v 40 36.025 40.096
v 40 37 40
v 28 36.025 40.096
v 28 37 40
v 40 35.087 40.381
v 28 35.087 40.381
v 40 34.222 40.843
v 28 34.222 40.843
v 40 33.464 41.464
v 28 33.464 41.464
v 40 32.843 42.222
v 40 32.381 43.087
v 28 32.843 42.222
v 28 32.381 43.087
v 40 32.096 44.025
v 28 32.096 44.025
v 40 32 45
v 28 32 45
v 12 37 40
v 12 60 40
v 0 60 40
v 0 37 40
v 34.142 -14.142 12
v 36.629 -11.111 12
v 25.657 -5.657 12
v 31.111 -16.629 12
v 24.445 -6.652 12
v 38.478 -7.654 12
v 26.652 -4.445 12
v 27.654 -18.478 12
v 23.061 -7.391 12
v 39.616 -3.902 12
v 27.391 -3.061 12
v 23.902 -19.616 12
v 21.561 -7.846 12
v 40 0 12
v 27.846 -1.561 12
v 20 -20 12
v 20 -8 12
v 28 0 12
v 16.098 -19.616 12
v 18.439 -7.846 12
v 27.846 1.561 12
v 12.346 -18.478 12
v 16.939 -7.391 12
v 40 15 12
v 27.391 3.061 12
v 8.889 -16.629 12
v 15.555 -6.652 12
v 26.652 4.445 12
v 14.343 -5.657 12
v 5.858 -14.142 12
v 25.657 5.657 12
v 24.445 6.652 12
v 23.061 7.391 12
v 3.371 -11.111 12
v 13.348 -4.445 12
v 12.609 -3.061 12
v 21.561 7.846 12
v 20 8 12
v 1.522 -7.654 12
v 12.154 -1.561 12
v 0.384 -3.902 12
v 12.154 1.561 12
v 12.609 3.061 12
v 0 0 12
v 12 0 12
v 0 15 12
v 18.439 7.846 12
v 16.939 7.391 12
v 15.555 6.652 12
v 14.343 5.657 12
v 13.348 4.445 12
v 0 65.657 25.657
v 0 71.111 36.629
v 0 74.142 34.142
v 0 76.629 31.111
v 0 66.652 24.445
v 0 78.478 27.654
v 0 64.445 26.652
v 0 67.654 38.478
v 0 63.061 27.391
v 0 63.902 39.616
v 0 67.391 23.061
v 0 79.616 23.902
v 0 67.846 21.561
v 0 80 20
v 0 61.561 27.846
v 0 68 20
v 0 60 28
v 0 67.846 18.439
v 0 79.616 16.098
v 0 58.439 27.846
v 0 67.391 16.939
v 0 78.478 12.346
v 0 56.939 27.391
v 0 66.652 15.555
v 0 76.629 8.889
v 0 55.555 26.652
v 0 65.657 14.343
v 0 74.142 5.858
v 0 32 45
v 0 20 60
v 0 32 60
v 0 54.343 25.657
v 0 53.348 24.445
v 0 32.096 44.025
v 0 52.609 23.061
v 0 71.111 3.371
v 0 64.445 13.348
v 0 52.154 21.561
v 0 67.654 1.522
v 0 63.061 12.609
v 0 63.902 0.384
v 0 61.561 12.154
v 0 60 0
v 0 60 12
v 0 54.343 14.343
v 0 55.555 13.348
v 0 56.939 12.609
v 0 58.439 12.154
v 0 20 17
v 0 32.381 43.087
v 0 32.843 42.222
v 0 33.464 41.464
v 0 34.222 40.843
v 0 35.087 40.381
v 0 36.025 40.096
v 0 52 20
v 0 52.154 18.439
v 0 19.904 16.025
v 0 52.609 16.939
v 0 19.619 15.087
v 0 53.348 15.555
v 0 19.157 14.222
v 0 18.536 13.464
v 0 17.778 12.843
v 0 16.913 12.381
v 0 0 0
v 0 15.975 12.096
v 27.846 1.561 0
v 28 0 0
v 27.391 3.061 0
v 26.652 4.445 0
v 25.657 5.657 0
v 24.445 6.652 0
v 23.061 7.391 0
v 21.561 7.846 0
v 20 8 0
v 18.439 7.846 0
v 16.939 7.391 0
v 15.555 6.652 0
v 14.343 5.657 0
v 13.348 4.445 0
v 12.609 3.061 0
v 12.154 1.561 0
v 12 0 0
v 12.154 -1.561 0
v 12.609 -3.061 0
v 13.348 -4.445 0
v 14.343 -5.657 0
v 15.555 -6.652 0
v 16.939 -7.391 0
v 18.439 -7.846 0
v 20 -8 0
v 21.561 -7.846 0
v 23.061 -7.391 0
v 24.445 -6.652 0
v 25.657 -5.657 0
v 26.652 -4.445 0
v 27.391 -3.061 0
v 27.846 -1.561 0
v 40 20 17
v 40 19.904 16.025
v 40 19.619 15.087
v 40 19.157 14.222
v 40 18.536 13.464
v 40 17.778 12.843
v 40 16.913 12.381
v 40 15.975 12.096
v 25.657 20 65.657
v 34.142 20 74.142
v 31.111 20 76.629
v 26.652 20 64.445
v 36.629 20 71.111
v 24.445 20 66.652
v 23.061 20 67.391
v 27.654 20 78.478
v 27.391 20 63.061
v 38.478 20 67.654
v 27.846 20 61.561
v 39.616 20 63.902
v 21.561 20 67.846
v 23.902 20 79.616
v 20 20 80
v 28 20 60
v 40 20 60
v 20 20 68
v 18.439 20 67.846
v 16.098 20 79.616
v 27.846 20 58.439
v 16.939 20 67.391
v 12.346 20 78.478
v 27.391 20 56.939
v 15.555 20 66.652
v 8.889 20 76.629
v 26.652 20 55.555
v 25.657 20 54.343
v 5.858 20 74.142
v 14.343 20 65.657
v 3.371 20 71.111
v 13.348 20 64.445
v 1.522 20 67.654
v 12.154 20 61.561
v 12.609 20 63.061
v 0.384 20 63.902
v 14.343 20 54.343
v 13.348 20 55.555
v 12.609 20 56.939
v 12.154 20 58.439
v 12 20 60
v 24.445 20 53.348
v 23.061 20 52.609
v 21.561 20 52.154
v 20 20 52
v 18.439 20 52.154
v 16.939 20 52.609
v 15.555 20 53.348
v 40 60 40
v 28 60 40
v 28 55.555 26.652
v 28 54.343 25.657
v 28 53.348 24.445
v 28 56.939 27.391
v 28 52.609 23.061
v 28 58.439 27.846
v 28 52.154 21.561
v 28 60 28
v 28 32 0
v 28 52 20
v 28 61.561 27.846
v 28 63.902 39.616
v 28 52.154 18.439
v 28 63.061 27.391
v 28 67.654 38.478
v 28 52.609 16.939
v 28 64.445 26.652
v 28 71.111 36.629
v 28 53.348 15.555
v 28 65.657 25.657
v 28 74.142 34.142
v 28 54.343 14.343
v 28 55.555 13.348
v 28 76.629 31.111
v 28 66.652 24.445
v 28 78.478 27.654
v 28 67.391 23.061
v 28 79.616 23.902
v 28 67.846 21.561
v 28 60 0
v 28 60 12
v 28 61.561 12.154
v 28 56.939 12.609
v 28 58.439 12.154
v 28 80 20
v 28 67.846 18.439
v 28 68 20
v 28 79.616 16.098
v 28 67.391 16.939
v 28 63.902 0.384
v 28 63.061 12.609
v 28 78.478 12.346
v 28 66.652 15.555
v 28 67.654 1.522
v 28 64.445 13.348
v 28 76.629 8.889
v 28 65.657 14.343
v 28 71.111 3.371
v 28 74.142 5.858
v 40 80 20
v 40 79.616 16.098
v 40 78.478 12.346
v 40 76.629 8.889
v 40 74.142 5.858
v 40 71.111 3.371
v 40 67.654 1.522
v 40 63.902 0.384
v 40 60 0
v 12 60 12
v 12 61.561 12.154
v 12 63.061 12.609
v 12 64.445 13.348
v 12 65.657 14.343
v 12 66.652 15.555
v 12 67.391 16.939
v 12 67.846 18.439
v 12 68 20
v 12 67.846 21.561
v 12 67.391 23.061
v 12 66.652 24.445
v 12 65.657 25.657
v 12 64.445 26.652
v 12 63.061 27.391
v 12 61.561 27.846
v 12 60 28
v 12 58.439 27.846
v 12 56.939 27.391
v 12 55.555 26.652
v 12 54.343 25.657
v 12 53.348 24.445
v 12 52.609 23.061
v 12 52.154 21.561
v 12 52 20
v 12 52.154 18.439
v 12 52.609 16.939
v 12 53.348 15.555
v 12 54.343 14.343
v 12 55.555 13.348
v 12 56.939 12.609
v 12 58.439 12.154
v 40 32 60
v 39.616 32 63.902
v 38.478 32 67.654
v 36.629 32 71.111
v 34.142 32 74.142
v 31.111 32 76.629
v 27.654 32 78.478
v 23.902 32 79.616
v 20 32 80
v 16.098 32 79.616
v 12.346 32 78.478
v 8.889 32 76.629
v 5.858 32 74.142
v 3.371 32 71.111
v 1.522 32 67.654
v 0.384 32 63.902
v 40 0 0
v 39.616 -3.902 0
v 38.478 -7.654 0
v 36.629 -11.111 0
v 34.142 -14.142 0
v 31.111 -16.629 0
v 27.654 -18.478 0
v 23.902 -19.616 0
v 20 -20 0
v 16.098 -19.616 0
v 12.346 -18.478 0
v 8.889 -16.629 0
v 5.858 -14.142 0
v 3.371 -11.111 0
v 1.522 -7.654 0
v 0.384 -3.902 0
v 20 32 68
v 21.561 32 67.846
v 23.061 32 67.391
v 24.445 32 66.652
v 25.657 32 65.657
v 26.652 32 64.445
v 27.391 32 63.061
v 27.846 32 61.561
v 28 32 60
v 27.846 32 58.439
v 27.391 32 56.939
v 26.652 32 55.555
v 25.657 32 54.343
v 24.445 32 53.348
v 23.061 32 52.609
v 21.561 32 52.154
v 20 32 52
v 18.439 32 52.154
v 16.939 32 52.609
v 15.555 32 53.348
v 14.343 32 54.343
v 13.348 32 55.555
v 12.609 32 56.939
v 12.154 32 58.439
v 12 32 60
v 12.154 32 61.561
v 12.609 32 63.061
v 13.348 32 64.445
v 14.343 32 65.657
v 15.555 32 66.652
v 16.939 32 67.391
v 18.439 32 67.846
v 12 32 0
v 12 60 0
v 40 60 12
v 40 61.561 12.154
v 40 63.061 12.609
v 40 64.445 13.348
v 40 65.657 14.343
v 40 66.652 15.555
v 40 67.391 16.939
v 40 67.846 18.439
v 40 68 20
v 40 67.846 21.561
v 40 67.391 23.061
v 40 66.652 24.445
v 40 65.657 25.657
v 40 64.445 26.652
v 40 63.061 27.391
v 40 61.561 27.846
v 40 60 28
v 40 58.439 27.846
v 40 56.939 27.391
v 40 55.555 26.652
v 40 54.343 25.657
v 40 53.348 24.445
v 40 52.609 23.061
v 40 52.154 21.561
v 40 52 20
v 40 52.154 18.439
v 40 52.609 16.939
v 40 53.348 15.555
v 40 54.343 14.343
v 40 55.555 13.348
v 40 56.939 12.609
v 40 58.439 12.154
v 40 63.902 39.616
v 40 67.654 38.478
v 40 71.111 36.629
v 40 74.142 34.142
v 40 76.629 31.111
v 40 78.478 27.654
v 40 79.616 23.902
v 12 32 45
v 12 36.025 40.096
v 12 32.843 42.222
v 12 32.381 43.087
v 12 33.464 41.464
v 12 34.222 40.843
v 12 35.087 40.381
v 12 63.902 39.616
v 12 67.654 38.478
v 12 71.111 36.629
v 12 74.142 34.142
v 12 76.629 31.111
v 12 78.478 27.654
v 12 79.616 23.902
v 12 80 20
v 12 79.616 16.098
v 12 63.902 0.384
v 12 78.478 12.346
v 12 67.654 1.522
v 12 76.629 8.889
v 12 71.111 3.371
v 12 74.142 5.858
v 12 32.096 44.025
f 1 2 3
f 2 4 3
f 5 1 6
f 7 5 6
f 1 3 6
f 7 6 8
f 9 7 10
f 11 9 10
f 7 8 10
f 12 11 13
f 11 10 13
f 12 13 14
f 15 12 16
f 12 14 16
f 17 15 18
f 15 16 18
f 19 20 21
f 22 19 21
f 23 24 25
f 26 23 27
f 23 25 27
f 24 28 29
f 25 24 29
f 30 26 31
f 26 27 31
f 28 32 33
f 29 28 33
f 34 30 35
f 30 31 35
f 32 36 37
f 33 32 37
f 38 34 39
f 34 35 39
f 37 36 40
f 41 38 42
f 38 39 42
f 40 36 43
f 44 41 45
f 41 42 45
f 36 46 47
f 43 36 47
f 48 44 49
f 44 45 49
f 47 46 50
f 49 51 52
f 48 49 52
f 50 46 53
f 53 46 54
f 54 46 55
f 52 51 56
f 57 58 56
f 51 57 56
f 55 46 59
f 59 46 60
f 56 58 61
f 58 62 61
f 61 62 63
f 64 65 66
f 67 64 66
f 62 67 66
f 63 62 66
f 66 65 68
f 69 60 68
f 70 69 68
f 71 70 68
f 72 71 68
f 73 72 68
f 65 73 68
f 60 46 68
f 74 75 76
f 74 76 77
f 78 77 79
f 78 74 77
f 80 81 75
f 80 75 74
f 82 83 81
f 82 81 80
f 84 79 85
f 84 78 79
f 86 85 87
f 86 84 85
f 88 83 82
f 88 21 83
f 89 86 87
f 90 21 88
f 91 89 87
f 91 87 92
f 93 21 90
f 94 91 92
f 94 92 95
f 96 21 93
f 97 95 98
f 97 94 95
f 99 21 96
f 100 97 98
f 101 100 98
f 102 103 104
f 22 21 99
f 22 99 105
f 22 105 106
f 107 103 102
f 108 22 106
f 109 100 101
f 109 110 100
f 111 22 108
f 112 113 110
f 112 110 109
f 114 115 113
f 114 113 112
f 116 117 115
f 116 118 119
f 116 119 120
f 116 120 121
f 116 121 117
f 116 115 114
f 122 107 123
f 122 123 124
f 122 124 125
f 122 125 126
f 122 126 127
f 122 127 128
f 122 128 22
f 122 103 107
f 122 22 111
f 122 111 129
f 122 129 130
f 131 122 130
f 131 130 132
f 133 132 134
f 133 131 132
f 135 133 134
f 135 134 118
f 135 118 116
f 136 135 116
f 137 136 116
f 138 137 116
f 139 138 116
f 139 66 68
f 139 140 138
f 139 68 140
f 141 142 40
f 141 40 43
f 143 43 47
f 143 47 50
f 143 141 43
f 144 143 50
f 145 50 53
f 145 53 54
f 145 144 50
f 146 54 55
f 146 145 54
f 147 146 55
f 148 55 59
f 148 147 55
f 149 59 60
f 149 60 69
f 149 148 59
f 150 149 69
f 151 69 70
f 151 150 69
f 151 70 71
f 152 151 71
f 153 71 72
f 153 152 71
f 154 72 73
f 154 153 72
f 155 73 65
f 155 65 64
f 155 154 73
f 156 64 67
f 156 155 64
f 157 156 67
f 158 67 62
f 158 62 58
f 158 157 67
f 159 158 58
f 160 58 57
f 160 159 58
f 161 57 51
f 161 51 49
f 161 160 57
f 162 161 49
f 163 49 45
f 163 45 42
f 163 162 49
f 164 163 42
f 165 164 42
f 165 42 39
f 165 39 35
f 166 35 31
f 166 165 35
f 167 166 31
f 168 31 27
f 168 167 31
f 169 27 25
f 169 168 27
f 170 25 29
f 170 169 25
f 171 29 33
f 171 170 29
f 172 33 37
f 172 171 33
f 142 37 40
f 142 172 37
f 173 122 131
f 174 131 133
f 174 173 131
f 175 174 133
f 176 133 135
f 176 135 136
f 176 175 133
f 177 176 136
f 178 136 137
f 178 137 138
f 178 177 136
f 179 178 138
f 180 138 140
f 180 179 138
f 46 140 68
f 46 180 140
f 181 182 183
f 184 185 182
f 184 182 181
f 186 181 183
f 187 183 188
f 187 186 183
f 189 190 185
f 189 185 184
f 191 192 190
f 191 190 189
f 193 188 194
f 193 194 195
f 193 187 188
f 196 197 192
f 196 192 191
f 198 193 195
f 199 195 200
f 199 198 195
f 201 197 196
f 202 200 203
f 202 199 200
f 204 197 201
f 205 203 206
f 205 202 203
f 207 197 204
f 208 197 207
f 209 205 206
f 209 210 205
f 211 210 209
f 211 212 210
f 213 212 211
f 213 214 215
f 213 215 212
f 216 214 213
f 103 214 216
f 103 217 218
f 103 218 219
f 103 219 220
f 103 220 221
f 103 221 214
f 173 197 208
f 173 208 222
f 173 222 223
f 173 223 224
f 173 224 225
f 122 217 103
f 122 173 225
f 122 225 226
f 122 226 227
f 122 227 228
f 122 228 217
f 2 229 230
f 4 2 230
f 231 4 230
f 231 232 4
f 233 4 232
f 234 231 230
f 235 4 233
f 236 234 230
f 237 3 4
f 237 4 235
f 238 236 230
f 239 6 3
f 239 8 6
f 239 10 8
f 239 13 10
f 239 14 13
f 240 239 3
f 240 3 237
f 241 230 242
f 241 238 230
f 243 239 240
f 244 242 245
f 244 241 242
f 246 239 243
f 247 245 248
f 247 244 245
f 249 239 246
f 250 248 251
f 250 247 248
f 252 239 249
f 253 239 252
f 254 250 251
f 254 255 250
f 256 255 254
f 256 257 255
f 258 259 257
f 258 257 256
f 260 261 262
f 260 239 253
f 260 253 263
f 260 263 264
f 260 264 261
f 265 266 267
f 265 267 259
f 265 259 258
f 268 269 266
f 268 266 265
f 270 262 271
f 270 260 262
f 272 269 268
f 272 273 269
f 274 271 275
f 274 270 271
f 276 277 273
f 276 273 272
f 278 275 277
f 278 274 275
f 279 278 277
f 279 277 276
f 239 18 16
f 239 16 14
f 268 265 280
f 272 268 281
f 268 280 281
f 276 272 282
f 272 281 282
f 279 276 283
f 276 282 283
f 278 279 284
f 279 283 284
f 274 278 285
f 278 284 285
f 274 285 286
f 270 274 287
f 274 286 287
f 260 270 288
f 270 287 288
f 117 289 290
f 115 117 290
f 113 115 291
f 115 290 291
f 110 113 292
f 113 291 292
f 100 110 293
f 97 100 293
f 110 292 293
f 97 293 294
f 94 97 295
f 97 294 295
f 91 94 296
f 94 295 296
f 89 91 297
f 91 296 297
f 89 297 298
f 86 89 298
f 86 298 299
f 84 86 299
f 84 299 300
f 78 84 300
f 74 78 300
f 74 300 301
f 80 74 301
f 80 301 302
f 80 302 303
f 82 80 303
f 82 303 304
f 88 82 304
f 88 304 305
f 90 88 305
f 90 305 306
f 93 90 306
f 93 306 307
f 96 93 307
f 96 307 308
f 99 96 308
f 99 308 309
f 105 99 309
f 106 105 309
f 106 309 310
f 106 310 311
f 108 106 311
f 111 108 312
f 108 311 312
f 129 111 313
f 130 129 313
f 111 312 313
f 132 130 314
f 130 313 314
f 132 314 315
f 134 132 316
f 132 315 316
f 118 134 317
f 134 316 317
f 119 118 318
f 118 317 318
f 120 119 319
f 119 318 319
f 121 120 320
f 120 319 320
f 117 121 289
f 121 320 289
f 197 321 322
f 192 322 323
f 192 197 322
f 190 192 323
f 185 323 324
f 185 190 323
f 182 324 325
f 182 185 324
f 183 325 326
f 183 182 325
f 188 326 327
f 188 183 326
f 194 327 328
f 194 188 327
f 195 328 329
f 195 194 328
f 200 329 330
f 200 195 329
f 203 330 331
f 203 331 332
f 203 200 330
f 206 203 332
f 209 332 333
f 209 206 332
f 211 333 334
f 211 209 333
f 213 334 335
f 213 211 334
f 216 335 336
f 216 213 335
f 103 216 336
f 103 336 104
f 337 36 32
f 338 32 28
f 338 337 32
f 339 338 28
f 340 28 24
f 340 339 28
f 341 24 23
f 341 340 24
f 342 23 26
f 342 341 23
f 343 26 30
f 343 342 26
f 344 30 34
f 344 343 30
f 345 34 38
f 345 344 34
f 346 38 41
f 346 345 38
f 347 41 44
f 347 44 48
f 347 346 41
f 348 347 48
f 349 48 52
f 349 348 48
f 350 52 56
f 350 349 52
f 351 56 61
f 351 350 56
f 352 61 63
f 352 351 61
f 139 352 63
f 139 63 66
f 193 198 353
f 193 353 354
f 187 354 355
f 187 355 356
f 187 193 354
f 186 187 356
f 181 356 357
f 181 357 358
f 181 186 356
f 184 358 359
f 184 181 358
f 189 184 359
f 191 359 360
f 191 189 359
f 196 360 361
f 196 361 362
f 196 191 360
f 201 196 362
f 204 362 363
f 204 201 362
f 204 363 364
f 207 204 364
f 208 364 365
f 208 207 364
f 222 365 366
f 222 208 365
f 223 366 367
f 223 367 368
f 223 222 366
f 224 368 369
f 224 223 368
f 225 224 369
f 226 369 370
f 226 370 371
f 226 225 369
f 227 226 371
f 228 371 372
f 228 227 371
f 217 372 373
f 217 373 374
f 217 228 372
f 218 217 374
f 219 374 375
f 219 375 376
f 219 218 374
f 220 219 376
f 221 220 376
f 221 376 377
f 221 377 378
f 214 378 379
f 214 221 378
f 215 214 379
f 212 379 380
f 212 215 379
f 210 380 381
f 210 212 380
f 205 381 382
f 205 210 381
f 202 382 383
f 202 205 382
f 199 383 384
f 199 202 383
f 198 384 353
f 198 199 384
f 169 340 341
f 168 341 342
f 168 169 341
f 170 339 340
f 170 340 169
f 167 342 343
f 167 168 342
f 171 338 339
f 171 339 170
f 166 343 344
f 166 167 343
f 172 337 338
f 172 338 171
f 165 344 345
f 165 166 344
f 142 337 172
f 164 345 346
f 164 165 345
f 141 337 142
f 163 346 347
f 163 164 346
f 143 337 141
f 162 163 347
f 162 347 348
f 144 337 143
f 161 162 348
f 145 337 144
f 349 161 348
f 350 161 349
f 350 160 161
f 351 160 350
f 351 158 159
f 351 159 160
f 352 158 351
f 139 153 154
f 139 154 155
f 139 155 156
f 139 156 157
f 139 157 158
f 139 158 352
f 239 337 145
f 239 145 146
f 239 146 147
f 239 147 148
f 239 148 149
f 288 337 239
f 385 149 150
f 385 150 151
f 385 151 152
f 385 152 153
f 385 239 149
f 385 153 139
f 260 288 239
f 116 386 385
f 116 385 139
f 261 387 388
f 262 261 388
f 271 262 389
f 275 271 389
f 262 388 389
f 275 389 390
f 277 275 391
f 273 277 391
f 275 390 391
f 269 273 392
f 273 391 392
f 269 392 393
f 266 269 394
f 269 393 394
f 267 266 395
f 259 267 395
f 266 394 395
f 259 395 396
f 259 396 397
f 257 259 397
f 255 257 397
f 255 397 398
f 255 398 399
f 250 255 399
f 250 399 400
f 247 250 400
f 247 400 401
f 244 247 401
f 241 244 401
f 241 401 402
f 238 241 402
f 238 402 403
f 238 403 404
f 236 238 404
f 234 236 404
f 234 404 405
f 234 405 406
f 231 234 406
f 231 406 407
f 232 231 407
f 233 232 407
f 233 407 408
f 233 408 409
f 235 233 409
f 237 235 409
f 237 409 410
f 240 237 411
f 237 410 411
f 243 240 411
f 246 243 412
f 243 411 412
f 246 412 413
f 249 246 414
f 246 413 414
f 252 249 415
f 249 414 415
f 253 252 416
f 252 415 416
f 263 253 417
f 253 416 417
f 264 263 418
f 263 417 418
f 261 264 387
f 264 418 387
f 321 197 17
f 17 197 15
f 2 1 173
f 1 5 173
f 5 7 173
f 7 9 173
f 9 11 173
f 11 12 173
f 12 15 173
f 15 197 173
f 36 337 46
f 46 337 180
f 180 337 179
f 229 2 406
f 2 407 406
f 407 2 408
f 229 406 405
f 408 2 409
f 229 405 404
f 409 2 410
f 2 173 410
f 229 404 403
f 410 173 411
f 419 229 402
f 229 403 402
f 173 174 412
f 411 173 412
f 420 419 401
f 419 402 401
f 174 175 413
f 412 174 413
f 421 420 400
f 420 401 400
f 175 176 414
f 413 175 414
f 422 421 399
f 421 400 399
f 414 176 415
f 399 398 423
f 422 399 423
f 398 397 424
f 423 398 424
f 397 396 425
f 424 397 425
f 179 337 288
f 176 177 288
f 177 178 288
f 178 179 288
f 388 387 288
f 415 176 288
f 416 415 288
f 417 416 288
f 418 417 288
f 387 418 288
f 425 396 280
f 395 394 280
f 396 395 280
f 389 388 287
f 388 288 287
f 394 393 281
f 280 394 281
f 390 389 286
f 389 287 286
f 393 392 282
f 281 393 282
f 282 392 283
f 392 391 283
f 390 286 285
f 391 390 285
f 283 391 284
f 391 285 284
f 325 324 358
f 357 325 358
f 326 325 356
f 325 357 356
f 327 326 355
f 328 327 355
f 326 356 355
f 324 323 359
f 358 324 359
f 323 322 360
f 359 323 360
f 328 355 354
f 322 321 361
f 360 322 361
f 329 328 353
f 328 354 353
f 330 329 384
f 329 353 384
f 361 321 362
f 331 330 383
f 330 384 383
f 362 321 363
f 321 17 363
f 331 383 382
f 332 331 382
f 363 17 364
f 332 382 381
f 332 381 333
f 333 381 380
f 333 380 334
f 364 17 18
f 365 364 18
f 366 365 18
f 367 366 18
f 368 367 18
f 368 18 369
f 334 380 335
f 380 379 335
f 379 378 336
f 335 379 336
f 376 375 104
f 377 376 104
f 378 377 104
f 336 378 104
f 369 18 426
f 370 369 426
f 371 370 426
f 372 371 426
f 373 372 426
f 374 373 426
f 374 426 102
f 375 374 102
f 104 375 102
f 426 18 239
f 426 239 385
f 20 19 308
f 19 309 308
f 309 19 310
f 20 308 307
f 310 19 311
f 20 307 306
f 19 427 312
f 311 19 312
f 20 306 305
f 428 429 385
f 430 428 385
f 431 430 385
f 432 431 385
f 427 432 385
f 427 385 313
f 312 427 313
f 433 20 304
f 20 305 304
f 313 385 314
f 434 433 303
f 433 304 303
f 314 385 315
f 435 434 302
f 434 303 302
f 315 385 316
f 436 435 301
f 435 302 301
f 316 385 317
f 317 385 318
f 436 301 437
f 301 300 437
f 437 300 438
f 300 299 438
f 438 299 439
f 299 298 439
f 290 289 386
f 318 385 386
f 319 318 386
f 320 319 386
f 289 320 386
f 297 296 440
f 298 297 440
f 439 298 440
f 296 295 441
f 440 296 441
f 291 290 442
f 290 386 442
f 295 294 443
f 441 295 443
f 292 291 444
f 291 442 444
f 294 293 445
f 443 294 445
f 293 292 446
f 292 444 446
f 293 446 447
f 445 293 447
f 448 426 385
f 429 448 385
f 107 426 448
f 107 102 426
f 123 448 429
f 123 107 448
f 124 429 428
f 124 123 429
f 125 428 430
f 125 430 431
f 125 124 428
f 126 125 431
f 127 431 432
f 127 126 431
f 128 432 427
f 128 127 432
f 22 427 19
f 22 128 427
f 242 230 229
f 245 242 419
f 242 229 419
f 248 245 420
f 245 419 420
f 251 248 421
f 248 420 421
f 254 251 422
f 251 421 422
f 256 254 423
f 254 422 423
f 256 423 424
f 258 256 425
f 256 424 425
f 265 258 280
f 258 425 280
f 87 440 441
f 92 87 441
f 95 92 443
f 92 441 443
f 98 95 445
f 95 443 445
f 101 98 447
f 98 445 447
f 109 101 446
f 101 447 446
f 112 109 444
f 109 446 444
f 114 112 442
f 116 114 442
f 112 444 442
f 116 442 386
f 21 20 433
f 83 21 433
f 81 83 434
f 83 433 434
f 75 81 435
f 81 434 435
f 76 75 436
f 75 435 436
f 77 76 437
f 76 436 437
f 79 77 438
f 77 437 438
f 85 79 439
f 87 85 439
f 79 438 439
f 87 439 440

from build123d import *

# Parameters (mm, degrees)
SKETCH1_R           = 8
BOSS_EXTRUDE1_DEPTH = 12
SKETCH2_R           = 8
BOSS_EXTRUDE2_DEPTH = 12
SKETCH3_W           = 12
SKETCH3_H           = 48
BOSS_EXTRUDE3_DEPTH = 40
SKETCH4_R           = 8
CUT_EXTRUDE1_DEPTH  = 40
FILLET1_R           = 5


with BuildPart() as part:
    # Sketch1 → Boss-Extrude1 (new body)
    with BuildSketch(Plane.XY):
        with BuildLine():
            Line((0, 0), (0, 20))
            Line((0, 20), (40, 20))
            Line((40, 20), (40, 0))
            ThreePointArc((40, 0), (20, -20), (0, 0))
        make_face()
        with Locations((20, 0)):
            Circle(SKETCH1_R, mode=Mode.SUBTRACT)
    extrude(amount=BOSS_EXTRUDE1_DEPTH)

    # Sketch2 → Boss-Extrude2 (add)
    with BuildSketch(Plane(origin=(0, 20, 0), x_dir=(1, 0, 0), z_dir=(0, 1, 0))):
        with BuildLine():
            Line((0, 0), (40, 0))
            Line((40, 0), (40, -60))
            ThreePointArc((40, -60), (20, -80), (0, -60))
            Line((0, -60), (0, 0))
        make_face()
        with Locations(Location((20, -60, 0), (0, 0, 270))):
            Circle(SKETCH2_R, mode=Mode.SUBTRACT)
    extrude(amount=BOSS_EXTRUDE2_DEPTH)

    # Sketch3 → Boss-Extrude3 (add)
    with BuildSketch(Plane(origin=(0, 0, 0), x_dir=(-1, 0, 0), z_dir=(0, 0, -1))):
        with Locations((-34, 56)):
            Rectangle(SKETCH3_W, SKETCH3_H)
        with Locations((-6, 56)):
            Rectangle(SKETCH3_W, SKETCH3_H)
    extrude(amount=-BOSS_EXTRUDE3_DEPTH)

    # Sketch4 → Cut-Extrude1 (cut)
    with BuildSketch(Plane(origin=(40, 0, 0), x_dir=(0, 0, -1), z_dir=(1, 0, 0))):
        with BuildLine():
            ThreePointArc((-20, 80), (-5.857864376, 74.142135624), (0, 60))
            Line((0, 60), (0, 80))
            Line((0, 80), (-20, 80))
        make_face()
        with BuildLine():
            ThreePointArc((-40, 60), (-34.142135624, 74.142135624), (-20, 80))
            Line((-20, 80), (-40, 80))
            Line((-40, 80), (-40, 60))
        make_face()
        with Locations((-20, 60)):
            Circle(SKETCH4_R)
    extrude(amount=-CUT_EXTRUDE1_DEPTH, mode=Mode.SUBTRACT)

    # Fillet1
    fillet1_edges = [part.edges().sort_by_distance(p)[0] for p in [
        (20, 20, 12),
        (34, 32, 40),
        (6, 32, 40),
    ]]
    fillet(fillet1_edges, radius=FILLET1_R)


solid = part.part
